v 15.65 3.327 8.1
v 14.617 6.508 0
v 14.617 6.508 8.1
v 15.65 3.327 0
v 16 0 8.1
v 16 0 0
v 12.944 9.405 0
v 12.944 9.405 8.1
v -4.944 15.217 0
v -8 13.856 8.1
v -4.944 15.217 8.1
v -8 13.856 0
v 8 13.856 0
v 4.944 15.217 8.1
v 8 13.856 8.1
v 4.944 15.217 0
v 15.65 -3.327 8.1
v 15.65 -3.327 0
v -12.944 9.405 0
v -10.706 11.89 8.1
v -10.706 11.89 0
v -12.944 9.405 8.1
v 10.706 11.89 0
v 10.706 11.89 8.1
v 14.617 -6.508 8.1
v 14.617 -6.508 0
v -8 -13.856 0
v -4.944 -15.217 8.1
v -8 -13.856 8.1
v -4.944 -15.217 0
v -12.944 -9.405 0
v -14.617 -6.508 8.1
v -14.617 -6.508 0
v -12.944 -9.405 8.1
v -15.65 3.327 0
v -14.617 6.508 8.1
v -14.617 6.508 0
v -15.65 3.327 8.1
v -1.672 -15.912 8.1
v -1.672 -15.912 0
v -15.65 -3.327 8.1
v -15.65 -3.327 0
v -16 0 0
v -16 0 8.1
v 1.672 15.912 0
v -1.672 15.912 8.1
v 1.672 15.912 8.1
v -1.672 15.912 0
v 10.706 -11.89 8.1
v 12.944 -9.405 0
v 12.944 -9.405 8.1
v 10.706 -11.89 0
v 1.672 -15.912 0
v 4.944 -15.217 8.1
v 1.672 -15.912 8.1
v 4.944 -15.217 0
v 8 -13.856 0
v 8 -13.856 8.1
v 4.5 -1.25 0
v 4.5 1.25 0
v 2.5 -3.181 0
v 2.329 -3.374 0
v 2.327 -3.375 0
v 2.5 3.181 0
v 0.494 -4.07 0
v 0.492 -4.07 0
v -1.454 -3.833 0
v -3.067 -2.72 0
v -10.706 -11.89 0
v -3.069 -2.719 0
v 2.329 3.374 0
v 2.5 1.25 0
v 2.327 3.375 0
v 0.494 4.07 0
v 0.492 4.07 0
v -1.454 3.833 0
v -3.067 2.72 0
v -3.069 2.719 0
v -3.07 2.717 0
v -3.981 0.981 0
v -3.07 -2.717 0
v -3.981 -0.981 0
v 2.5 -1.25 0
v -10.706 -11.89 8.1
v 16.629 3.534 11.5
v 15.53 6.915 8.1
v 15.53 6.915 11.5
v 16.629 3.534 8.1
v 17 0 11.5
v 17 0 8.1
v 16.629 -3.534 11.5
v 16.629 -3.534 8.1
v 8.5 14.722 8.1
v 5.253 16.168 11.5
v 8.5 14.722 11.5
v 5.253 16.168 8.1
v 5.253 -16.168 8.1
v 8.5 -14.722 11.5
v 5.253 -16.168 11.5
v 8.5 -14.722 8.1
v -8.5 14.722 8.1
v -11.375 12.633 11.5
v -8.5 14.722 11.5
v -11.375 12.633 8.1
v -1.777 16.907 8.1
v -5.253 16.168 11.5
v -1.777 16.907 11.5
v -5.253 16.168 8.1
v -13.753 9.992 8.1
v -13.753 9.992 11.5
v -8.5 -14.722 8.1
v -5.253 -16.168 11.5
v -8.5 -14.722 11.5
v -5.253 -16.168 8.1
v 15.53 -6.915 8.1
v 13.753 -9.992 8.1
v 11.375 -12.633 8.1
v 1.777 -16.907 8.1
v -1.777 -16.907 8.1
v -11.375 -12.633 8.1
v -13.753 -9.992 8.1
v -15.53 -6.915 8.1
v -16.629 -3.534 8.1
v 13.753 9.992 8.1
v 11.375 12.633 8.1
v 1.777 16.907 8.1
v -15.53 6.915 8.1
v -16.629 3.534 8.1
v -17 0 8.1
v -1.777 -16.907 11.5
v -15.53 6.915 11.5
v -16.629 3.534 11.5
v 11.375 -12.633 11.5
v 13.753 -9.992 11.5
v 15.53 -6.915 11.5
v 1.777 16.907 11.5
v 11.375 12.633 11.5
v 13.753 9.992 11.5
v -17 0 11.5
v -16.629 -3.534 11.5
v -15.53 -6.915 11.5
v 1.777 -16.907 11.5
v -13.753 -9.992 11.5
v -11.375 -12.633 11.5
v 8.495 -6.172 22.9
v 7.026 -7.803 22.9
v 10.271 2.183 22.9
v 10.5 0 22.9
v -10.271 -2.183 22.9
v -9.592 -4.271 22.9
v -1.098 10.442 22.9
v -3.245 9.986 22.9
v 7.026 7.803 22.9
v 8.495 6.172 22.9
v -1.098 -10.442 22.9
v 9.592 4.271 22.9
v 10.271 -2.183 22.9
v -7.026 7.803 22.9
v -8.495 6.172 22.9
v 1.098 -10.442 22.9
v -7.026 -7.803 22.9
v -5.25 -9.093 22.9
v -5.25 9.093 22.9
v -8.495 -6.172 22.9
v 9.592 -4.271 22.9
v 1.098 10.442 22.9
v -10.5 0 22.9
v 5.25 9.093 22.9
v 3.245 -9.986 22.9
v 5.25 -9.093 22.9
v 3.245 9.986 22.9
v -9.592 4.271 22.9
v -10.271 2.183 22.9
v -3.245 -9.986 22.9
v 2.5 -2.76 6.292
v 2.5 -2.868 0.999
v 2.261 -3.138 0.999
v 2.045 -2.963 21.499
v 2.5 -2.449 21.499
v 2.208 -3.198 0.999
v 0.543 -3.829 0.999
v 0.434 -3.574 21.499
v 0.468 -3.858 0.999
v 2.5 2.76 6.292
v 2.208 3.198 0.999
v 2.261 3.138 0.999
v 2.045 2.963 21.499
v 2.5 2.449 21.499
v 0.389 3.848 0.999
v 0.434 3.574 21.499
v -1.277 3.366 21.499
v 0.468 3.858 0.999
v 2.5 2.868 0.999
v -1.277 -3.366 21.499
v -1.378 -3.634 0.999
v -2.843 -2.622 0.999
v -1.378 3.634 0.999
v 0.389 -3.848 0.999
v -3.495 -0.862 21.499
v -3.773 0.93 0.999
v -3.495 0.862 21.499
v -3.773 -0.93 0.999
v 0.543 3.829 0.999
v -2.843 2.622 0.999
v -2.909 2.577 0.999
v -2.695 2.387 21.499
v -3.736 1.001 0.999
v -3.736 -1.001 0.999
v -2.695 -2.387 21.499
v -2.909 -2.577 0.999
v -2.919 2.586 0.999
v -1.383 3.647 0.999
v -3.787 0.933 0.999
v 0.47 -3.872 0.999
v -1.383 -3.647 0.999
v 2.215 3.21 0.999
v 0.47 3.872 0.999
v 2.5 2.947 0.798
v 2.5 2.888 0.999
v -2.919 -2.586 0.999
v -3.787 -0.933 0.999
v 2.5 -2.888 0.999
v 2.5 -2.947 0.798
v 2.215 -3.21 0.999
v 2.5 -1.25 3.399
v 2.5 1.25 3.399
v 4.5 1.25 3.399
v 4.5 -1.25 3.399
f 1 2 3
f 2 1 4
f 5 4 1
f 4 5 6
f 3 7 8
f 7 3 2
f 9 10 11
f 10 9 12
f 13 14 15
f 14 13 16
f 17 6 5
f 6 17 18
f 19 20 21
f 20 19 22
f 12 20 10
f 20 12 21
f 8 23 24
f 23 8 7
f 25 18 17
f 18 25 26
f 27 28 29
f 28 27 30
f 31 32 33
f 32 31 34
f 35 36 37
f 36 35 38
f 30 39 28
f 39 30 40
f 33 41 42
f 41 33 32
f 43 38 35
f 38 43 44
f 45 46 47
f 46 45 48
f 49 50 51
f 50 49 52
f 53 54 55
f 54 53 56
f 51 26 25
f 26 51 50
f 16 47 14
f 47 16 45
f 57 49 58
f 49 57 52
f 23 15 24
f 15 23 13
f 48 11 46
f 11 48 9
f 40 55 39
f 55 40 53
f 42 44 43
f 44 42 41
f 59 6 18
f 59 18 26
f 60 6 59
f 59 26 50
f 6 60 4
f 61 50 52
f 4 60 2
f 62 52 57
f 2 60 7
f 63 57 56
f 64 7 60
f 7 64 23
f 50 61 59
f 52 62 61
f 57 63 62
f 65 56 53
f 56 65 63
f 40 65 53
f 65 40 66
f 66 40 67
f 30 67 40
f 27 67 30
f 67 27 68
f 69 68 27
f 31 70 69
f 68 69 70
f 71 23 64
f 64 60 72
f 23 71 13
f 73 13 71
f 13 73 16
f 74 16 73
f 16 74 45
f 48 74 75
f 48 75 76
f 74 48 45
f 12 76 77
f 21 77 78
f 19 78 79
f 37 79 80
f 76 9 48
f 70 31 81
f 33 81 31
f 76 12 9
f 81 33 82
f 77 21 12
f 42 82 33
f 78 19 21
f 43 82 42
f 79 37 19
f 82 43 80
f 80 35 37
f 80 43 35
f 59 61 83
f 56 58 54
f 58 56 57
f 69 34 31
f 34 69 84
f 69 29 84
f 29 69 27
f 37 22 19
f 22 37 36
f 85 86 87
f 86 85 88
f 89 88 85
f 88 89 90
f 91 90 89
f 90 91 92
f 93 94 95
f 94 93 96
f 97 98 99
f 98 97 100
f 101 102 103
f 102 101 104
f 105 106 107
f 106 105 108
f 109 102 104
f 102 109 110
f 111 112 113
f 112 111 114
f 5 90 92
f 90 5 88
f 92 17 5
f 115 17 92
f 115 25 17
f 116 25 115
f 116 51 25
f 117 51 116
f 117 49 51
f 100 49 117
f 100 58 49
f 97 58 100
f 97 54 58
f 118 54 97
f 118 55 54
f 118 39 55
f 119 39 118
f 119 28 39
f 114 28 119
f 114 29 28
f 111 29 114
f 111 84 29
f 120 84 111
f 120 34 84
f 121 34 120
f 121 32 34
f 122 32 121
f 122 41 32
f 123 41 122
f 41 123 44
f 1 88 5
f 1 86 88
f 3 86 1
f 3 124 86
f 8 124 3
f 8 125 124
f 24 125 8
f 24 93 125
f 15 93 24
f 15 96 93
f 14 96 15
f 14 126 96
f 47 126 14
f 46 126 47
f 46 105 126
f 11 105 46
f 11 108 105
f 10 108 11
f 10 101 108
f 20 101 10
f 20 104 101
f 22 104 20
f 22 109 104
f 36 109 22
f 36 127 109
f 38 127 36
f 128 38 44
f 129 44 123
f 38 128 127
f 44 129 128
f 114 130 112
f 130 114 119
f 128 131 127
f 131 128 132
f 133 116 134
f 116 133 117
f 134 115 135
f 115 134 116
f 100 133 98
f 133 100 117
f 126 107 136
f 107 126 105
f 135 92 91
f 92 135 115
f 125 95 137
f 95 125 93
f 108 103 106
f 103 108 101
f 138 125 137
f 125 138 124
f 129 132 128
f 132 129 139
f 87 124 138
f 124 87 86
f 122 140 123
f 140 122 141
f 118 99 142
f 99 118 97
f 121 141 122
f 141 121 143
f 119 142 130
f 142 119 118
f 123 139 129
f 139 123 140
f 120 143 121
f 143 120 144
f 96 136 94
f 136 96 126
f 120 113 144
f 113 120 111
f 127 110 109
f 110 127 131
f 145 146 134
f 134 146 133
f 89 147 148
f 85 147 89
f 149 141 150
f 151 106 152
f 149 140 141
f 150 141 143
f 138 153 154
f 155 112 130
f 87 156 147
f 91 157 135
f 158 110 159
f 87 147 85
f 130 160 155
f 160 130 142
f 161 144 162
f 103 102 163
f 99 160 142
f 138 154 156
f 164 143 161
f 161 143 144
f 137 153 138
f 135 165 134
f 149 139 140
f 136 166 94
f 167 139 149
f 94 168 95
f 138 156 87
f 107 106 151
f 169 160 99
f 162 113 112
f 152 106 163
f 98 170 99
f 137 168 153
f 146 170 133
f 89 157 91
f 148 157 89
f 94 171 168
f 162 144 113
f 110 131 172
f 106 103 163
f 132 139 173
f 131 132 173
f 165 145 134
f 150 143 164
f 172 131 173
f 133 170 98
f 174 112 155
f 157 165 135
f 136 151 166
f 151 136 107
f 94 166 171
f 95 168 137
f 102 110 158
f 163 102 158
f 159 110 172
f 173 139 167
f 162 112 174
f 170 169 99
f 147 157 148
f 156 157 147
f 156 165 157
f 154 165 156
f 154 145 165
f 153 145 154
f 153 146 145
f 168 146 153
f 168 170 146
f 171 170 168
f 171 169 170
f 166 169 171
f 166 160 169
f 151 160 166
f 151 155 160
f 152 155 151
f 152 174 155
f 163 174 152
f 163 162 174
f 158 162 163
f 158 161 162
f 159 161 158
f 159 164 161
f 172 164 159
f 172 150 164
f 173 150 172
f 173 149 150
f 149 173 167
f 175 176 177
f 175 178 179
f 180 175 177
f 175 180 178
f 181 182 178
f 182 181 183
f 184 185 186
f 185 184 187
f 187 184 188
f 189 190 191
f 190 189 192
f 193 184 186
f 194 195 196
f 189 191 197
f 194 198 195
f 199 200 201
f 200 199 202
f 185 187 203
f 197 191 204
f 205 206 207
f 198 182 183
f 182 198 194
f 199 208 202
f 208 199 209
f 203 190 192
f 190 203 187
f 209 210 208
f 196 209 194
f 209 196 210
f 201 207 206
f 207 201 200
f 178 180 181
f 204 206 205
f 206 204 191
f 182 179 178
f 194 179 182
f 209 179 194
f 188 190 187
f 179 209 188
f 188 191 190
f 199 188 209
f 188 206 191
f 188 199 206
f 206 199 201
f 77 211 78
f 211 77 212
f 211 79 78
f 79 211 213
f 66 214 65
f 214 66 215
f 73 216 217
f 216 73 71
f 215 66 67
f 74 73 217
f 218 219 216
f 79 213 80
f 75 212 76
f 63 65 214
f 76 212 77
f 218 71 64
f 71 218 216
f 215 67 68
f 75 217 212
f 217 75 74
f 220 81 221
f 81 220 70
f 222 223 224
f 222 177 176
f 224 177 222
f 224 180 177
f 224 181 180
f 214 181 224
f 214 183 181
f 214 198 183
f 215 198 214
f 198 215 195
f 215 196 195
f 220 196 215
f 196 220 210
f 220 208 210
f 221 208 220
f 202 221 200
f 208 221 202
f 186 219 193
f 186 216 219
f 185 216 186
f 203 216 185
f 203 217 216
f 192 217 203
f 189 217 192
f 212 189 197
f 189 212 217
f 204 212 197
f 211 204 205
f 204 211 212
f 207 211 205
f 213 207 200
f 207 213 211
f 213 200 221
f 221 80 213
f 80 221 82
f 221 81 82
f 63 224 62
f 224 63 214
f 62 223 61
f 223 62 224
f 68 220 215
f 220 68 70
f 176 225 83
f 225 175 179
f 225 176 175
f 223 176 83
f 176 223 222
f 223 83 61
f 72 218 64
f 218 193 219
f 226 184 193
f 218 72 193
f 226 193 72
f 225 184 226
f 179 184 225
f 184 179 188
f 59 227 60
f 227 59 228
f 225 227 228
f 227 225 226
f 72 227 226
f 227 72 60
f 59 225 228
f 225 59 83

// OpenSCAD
notch_width = 2.5;

module peg_hole() {
    union() {
        difference() {
            union() {
                cylinder(h=21.5,d1=7.8,d2=7.2,center=false);
                // Chamfer
                cylinder(h=1,d1=8.2,d2=7.8,center=false);
            }
            translate([2.5, -5, -0.1]) {
                cube([10,10,30]);
            }
        }
        translate([0,-notch_width/2,0]) {
            cube([4.5,notch_width,3.4]);
        }
    }
}

module shell() {
    union() {
        cylinder(h=12,d=32.0,center=false);
        translate([0,0,8.1]) {
            cylinder(h=3.4,d=34,center=false);
        }
        translate([0,0,11.5]) {
            cylinder(h=11.4,d1=34,d2=21,center=false);
        }
    }
}

difference() {
    shell();
    translate([0,0,-0.001]) {
        peg_hole();
    }
}
